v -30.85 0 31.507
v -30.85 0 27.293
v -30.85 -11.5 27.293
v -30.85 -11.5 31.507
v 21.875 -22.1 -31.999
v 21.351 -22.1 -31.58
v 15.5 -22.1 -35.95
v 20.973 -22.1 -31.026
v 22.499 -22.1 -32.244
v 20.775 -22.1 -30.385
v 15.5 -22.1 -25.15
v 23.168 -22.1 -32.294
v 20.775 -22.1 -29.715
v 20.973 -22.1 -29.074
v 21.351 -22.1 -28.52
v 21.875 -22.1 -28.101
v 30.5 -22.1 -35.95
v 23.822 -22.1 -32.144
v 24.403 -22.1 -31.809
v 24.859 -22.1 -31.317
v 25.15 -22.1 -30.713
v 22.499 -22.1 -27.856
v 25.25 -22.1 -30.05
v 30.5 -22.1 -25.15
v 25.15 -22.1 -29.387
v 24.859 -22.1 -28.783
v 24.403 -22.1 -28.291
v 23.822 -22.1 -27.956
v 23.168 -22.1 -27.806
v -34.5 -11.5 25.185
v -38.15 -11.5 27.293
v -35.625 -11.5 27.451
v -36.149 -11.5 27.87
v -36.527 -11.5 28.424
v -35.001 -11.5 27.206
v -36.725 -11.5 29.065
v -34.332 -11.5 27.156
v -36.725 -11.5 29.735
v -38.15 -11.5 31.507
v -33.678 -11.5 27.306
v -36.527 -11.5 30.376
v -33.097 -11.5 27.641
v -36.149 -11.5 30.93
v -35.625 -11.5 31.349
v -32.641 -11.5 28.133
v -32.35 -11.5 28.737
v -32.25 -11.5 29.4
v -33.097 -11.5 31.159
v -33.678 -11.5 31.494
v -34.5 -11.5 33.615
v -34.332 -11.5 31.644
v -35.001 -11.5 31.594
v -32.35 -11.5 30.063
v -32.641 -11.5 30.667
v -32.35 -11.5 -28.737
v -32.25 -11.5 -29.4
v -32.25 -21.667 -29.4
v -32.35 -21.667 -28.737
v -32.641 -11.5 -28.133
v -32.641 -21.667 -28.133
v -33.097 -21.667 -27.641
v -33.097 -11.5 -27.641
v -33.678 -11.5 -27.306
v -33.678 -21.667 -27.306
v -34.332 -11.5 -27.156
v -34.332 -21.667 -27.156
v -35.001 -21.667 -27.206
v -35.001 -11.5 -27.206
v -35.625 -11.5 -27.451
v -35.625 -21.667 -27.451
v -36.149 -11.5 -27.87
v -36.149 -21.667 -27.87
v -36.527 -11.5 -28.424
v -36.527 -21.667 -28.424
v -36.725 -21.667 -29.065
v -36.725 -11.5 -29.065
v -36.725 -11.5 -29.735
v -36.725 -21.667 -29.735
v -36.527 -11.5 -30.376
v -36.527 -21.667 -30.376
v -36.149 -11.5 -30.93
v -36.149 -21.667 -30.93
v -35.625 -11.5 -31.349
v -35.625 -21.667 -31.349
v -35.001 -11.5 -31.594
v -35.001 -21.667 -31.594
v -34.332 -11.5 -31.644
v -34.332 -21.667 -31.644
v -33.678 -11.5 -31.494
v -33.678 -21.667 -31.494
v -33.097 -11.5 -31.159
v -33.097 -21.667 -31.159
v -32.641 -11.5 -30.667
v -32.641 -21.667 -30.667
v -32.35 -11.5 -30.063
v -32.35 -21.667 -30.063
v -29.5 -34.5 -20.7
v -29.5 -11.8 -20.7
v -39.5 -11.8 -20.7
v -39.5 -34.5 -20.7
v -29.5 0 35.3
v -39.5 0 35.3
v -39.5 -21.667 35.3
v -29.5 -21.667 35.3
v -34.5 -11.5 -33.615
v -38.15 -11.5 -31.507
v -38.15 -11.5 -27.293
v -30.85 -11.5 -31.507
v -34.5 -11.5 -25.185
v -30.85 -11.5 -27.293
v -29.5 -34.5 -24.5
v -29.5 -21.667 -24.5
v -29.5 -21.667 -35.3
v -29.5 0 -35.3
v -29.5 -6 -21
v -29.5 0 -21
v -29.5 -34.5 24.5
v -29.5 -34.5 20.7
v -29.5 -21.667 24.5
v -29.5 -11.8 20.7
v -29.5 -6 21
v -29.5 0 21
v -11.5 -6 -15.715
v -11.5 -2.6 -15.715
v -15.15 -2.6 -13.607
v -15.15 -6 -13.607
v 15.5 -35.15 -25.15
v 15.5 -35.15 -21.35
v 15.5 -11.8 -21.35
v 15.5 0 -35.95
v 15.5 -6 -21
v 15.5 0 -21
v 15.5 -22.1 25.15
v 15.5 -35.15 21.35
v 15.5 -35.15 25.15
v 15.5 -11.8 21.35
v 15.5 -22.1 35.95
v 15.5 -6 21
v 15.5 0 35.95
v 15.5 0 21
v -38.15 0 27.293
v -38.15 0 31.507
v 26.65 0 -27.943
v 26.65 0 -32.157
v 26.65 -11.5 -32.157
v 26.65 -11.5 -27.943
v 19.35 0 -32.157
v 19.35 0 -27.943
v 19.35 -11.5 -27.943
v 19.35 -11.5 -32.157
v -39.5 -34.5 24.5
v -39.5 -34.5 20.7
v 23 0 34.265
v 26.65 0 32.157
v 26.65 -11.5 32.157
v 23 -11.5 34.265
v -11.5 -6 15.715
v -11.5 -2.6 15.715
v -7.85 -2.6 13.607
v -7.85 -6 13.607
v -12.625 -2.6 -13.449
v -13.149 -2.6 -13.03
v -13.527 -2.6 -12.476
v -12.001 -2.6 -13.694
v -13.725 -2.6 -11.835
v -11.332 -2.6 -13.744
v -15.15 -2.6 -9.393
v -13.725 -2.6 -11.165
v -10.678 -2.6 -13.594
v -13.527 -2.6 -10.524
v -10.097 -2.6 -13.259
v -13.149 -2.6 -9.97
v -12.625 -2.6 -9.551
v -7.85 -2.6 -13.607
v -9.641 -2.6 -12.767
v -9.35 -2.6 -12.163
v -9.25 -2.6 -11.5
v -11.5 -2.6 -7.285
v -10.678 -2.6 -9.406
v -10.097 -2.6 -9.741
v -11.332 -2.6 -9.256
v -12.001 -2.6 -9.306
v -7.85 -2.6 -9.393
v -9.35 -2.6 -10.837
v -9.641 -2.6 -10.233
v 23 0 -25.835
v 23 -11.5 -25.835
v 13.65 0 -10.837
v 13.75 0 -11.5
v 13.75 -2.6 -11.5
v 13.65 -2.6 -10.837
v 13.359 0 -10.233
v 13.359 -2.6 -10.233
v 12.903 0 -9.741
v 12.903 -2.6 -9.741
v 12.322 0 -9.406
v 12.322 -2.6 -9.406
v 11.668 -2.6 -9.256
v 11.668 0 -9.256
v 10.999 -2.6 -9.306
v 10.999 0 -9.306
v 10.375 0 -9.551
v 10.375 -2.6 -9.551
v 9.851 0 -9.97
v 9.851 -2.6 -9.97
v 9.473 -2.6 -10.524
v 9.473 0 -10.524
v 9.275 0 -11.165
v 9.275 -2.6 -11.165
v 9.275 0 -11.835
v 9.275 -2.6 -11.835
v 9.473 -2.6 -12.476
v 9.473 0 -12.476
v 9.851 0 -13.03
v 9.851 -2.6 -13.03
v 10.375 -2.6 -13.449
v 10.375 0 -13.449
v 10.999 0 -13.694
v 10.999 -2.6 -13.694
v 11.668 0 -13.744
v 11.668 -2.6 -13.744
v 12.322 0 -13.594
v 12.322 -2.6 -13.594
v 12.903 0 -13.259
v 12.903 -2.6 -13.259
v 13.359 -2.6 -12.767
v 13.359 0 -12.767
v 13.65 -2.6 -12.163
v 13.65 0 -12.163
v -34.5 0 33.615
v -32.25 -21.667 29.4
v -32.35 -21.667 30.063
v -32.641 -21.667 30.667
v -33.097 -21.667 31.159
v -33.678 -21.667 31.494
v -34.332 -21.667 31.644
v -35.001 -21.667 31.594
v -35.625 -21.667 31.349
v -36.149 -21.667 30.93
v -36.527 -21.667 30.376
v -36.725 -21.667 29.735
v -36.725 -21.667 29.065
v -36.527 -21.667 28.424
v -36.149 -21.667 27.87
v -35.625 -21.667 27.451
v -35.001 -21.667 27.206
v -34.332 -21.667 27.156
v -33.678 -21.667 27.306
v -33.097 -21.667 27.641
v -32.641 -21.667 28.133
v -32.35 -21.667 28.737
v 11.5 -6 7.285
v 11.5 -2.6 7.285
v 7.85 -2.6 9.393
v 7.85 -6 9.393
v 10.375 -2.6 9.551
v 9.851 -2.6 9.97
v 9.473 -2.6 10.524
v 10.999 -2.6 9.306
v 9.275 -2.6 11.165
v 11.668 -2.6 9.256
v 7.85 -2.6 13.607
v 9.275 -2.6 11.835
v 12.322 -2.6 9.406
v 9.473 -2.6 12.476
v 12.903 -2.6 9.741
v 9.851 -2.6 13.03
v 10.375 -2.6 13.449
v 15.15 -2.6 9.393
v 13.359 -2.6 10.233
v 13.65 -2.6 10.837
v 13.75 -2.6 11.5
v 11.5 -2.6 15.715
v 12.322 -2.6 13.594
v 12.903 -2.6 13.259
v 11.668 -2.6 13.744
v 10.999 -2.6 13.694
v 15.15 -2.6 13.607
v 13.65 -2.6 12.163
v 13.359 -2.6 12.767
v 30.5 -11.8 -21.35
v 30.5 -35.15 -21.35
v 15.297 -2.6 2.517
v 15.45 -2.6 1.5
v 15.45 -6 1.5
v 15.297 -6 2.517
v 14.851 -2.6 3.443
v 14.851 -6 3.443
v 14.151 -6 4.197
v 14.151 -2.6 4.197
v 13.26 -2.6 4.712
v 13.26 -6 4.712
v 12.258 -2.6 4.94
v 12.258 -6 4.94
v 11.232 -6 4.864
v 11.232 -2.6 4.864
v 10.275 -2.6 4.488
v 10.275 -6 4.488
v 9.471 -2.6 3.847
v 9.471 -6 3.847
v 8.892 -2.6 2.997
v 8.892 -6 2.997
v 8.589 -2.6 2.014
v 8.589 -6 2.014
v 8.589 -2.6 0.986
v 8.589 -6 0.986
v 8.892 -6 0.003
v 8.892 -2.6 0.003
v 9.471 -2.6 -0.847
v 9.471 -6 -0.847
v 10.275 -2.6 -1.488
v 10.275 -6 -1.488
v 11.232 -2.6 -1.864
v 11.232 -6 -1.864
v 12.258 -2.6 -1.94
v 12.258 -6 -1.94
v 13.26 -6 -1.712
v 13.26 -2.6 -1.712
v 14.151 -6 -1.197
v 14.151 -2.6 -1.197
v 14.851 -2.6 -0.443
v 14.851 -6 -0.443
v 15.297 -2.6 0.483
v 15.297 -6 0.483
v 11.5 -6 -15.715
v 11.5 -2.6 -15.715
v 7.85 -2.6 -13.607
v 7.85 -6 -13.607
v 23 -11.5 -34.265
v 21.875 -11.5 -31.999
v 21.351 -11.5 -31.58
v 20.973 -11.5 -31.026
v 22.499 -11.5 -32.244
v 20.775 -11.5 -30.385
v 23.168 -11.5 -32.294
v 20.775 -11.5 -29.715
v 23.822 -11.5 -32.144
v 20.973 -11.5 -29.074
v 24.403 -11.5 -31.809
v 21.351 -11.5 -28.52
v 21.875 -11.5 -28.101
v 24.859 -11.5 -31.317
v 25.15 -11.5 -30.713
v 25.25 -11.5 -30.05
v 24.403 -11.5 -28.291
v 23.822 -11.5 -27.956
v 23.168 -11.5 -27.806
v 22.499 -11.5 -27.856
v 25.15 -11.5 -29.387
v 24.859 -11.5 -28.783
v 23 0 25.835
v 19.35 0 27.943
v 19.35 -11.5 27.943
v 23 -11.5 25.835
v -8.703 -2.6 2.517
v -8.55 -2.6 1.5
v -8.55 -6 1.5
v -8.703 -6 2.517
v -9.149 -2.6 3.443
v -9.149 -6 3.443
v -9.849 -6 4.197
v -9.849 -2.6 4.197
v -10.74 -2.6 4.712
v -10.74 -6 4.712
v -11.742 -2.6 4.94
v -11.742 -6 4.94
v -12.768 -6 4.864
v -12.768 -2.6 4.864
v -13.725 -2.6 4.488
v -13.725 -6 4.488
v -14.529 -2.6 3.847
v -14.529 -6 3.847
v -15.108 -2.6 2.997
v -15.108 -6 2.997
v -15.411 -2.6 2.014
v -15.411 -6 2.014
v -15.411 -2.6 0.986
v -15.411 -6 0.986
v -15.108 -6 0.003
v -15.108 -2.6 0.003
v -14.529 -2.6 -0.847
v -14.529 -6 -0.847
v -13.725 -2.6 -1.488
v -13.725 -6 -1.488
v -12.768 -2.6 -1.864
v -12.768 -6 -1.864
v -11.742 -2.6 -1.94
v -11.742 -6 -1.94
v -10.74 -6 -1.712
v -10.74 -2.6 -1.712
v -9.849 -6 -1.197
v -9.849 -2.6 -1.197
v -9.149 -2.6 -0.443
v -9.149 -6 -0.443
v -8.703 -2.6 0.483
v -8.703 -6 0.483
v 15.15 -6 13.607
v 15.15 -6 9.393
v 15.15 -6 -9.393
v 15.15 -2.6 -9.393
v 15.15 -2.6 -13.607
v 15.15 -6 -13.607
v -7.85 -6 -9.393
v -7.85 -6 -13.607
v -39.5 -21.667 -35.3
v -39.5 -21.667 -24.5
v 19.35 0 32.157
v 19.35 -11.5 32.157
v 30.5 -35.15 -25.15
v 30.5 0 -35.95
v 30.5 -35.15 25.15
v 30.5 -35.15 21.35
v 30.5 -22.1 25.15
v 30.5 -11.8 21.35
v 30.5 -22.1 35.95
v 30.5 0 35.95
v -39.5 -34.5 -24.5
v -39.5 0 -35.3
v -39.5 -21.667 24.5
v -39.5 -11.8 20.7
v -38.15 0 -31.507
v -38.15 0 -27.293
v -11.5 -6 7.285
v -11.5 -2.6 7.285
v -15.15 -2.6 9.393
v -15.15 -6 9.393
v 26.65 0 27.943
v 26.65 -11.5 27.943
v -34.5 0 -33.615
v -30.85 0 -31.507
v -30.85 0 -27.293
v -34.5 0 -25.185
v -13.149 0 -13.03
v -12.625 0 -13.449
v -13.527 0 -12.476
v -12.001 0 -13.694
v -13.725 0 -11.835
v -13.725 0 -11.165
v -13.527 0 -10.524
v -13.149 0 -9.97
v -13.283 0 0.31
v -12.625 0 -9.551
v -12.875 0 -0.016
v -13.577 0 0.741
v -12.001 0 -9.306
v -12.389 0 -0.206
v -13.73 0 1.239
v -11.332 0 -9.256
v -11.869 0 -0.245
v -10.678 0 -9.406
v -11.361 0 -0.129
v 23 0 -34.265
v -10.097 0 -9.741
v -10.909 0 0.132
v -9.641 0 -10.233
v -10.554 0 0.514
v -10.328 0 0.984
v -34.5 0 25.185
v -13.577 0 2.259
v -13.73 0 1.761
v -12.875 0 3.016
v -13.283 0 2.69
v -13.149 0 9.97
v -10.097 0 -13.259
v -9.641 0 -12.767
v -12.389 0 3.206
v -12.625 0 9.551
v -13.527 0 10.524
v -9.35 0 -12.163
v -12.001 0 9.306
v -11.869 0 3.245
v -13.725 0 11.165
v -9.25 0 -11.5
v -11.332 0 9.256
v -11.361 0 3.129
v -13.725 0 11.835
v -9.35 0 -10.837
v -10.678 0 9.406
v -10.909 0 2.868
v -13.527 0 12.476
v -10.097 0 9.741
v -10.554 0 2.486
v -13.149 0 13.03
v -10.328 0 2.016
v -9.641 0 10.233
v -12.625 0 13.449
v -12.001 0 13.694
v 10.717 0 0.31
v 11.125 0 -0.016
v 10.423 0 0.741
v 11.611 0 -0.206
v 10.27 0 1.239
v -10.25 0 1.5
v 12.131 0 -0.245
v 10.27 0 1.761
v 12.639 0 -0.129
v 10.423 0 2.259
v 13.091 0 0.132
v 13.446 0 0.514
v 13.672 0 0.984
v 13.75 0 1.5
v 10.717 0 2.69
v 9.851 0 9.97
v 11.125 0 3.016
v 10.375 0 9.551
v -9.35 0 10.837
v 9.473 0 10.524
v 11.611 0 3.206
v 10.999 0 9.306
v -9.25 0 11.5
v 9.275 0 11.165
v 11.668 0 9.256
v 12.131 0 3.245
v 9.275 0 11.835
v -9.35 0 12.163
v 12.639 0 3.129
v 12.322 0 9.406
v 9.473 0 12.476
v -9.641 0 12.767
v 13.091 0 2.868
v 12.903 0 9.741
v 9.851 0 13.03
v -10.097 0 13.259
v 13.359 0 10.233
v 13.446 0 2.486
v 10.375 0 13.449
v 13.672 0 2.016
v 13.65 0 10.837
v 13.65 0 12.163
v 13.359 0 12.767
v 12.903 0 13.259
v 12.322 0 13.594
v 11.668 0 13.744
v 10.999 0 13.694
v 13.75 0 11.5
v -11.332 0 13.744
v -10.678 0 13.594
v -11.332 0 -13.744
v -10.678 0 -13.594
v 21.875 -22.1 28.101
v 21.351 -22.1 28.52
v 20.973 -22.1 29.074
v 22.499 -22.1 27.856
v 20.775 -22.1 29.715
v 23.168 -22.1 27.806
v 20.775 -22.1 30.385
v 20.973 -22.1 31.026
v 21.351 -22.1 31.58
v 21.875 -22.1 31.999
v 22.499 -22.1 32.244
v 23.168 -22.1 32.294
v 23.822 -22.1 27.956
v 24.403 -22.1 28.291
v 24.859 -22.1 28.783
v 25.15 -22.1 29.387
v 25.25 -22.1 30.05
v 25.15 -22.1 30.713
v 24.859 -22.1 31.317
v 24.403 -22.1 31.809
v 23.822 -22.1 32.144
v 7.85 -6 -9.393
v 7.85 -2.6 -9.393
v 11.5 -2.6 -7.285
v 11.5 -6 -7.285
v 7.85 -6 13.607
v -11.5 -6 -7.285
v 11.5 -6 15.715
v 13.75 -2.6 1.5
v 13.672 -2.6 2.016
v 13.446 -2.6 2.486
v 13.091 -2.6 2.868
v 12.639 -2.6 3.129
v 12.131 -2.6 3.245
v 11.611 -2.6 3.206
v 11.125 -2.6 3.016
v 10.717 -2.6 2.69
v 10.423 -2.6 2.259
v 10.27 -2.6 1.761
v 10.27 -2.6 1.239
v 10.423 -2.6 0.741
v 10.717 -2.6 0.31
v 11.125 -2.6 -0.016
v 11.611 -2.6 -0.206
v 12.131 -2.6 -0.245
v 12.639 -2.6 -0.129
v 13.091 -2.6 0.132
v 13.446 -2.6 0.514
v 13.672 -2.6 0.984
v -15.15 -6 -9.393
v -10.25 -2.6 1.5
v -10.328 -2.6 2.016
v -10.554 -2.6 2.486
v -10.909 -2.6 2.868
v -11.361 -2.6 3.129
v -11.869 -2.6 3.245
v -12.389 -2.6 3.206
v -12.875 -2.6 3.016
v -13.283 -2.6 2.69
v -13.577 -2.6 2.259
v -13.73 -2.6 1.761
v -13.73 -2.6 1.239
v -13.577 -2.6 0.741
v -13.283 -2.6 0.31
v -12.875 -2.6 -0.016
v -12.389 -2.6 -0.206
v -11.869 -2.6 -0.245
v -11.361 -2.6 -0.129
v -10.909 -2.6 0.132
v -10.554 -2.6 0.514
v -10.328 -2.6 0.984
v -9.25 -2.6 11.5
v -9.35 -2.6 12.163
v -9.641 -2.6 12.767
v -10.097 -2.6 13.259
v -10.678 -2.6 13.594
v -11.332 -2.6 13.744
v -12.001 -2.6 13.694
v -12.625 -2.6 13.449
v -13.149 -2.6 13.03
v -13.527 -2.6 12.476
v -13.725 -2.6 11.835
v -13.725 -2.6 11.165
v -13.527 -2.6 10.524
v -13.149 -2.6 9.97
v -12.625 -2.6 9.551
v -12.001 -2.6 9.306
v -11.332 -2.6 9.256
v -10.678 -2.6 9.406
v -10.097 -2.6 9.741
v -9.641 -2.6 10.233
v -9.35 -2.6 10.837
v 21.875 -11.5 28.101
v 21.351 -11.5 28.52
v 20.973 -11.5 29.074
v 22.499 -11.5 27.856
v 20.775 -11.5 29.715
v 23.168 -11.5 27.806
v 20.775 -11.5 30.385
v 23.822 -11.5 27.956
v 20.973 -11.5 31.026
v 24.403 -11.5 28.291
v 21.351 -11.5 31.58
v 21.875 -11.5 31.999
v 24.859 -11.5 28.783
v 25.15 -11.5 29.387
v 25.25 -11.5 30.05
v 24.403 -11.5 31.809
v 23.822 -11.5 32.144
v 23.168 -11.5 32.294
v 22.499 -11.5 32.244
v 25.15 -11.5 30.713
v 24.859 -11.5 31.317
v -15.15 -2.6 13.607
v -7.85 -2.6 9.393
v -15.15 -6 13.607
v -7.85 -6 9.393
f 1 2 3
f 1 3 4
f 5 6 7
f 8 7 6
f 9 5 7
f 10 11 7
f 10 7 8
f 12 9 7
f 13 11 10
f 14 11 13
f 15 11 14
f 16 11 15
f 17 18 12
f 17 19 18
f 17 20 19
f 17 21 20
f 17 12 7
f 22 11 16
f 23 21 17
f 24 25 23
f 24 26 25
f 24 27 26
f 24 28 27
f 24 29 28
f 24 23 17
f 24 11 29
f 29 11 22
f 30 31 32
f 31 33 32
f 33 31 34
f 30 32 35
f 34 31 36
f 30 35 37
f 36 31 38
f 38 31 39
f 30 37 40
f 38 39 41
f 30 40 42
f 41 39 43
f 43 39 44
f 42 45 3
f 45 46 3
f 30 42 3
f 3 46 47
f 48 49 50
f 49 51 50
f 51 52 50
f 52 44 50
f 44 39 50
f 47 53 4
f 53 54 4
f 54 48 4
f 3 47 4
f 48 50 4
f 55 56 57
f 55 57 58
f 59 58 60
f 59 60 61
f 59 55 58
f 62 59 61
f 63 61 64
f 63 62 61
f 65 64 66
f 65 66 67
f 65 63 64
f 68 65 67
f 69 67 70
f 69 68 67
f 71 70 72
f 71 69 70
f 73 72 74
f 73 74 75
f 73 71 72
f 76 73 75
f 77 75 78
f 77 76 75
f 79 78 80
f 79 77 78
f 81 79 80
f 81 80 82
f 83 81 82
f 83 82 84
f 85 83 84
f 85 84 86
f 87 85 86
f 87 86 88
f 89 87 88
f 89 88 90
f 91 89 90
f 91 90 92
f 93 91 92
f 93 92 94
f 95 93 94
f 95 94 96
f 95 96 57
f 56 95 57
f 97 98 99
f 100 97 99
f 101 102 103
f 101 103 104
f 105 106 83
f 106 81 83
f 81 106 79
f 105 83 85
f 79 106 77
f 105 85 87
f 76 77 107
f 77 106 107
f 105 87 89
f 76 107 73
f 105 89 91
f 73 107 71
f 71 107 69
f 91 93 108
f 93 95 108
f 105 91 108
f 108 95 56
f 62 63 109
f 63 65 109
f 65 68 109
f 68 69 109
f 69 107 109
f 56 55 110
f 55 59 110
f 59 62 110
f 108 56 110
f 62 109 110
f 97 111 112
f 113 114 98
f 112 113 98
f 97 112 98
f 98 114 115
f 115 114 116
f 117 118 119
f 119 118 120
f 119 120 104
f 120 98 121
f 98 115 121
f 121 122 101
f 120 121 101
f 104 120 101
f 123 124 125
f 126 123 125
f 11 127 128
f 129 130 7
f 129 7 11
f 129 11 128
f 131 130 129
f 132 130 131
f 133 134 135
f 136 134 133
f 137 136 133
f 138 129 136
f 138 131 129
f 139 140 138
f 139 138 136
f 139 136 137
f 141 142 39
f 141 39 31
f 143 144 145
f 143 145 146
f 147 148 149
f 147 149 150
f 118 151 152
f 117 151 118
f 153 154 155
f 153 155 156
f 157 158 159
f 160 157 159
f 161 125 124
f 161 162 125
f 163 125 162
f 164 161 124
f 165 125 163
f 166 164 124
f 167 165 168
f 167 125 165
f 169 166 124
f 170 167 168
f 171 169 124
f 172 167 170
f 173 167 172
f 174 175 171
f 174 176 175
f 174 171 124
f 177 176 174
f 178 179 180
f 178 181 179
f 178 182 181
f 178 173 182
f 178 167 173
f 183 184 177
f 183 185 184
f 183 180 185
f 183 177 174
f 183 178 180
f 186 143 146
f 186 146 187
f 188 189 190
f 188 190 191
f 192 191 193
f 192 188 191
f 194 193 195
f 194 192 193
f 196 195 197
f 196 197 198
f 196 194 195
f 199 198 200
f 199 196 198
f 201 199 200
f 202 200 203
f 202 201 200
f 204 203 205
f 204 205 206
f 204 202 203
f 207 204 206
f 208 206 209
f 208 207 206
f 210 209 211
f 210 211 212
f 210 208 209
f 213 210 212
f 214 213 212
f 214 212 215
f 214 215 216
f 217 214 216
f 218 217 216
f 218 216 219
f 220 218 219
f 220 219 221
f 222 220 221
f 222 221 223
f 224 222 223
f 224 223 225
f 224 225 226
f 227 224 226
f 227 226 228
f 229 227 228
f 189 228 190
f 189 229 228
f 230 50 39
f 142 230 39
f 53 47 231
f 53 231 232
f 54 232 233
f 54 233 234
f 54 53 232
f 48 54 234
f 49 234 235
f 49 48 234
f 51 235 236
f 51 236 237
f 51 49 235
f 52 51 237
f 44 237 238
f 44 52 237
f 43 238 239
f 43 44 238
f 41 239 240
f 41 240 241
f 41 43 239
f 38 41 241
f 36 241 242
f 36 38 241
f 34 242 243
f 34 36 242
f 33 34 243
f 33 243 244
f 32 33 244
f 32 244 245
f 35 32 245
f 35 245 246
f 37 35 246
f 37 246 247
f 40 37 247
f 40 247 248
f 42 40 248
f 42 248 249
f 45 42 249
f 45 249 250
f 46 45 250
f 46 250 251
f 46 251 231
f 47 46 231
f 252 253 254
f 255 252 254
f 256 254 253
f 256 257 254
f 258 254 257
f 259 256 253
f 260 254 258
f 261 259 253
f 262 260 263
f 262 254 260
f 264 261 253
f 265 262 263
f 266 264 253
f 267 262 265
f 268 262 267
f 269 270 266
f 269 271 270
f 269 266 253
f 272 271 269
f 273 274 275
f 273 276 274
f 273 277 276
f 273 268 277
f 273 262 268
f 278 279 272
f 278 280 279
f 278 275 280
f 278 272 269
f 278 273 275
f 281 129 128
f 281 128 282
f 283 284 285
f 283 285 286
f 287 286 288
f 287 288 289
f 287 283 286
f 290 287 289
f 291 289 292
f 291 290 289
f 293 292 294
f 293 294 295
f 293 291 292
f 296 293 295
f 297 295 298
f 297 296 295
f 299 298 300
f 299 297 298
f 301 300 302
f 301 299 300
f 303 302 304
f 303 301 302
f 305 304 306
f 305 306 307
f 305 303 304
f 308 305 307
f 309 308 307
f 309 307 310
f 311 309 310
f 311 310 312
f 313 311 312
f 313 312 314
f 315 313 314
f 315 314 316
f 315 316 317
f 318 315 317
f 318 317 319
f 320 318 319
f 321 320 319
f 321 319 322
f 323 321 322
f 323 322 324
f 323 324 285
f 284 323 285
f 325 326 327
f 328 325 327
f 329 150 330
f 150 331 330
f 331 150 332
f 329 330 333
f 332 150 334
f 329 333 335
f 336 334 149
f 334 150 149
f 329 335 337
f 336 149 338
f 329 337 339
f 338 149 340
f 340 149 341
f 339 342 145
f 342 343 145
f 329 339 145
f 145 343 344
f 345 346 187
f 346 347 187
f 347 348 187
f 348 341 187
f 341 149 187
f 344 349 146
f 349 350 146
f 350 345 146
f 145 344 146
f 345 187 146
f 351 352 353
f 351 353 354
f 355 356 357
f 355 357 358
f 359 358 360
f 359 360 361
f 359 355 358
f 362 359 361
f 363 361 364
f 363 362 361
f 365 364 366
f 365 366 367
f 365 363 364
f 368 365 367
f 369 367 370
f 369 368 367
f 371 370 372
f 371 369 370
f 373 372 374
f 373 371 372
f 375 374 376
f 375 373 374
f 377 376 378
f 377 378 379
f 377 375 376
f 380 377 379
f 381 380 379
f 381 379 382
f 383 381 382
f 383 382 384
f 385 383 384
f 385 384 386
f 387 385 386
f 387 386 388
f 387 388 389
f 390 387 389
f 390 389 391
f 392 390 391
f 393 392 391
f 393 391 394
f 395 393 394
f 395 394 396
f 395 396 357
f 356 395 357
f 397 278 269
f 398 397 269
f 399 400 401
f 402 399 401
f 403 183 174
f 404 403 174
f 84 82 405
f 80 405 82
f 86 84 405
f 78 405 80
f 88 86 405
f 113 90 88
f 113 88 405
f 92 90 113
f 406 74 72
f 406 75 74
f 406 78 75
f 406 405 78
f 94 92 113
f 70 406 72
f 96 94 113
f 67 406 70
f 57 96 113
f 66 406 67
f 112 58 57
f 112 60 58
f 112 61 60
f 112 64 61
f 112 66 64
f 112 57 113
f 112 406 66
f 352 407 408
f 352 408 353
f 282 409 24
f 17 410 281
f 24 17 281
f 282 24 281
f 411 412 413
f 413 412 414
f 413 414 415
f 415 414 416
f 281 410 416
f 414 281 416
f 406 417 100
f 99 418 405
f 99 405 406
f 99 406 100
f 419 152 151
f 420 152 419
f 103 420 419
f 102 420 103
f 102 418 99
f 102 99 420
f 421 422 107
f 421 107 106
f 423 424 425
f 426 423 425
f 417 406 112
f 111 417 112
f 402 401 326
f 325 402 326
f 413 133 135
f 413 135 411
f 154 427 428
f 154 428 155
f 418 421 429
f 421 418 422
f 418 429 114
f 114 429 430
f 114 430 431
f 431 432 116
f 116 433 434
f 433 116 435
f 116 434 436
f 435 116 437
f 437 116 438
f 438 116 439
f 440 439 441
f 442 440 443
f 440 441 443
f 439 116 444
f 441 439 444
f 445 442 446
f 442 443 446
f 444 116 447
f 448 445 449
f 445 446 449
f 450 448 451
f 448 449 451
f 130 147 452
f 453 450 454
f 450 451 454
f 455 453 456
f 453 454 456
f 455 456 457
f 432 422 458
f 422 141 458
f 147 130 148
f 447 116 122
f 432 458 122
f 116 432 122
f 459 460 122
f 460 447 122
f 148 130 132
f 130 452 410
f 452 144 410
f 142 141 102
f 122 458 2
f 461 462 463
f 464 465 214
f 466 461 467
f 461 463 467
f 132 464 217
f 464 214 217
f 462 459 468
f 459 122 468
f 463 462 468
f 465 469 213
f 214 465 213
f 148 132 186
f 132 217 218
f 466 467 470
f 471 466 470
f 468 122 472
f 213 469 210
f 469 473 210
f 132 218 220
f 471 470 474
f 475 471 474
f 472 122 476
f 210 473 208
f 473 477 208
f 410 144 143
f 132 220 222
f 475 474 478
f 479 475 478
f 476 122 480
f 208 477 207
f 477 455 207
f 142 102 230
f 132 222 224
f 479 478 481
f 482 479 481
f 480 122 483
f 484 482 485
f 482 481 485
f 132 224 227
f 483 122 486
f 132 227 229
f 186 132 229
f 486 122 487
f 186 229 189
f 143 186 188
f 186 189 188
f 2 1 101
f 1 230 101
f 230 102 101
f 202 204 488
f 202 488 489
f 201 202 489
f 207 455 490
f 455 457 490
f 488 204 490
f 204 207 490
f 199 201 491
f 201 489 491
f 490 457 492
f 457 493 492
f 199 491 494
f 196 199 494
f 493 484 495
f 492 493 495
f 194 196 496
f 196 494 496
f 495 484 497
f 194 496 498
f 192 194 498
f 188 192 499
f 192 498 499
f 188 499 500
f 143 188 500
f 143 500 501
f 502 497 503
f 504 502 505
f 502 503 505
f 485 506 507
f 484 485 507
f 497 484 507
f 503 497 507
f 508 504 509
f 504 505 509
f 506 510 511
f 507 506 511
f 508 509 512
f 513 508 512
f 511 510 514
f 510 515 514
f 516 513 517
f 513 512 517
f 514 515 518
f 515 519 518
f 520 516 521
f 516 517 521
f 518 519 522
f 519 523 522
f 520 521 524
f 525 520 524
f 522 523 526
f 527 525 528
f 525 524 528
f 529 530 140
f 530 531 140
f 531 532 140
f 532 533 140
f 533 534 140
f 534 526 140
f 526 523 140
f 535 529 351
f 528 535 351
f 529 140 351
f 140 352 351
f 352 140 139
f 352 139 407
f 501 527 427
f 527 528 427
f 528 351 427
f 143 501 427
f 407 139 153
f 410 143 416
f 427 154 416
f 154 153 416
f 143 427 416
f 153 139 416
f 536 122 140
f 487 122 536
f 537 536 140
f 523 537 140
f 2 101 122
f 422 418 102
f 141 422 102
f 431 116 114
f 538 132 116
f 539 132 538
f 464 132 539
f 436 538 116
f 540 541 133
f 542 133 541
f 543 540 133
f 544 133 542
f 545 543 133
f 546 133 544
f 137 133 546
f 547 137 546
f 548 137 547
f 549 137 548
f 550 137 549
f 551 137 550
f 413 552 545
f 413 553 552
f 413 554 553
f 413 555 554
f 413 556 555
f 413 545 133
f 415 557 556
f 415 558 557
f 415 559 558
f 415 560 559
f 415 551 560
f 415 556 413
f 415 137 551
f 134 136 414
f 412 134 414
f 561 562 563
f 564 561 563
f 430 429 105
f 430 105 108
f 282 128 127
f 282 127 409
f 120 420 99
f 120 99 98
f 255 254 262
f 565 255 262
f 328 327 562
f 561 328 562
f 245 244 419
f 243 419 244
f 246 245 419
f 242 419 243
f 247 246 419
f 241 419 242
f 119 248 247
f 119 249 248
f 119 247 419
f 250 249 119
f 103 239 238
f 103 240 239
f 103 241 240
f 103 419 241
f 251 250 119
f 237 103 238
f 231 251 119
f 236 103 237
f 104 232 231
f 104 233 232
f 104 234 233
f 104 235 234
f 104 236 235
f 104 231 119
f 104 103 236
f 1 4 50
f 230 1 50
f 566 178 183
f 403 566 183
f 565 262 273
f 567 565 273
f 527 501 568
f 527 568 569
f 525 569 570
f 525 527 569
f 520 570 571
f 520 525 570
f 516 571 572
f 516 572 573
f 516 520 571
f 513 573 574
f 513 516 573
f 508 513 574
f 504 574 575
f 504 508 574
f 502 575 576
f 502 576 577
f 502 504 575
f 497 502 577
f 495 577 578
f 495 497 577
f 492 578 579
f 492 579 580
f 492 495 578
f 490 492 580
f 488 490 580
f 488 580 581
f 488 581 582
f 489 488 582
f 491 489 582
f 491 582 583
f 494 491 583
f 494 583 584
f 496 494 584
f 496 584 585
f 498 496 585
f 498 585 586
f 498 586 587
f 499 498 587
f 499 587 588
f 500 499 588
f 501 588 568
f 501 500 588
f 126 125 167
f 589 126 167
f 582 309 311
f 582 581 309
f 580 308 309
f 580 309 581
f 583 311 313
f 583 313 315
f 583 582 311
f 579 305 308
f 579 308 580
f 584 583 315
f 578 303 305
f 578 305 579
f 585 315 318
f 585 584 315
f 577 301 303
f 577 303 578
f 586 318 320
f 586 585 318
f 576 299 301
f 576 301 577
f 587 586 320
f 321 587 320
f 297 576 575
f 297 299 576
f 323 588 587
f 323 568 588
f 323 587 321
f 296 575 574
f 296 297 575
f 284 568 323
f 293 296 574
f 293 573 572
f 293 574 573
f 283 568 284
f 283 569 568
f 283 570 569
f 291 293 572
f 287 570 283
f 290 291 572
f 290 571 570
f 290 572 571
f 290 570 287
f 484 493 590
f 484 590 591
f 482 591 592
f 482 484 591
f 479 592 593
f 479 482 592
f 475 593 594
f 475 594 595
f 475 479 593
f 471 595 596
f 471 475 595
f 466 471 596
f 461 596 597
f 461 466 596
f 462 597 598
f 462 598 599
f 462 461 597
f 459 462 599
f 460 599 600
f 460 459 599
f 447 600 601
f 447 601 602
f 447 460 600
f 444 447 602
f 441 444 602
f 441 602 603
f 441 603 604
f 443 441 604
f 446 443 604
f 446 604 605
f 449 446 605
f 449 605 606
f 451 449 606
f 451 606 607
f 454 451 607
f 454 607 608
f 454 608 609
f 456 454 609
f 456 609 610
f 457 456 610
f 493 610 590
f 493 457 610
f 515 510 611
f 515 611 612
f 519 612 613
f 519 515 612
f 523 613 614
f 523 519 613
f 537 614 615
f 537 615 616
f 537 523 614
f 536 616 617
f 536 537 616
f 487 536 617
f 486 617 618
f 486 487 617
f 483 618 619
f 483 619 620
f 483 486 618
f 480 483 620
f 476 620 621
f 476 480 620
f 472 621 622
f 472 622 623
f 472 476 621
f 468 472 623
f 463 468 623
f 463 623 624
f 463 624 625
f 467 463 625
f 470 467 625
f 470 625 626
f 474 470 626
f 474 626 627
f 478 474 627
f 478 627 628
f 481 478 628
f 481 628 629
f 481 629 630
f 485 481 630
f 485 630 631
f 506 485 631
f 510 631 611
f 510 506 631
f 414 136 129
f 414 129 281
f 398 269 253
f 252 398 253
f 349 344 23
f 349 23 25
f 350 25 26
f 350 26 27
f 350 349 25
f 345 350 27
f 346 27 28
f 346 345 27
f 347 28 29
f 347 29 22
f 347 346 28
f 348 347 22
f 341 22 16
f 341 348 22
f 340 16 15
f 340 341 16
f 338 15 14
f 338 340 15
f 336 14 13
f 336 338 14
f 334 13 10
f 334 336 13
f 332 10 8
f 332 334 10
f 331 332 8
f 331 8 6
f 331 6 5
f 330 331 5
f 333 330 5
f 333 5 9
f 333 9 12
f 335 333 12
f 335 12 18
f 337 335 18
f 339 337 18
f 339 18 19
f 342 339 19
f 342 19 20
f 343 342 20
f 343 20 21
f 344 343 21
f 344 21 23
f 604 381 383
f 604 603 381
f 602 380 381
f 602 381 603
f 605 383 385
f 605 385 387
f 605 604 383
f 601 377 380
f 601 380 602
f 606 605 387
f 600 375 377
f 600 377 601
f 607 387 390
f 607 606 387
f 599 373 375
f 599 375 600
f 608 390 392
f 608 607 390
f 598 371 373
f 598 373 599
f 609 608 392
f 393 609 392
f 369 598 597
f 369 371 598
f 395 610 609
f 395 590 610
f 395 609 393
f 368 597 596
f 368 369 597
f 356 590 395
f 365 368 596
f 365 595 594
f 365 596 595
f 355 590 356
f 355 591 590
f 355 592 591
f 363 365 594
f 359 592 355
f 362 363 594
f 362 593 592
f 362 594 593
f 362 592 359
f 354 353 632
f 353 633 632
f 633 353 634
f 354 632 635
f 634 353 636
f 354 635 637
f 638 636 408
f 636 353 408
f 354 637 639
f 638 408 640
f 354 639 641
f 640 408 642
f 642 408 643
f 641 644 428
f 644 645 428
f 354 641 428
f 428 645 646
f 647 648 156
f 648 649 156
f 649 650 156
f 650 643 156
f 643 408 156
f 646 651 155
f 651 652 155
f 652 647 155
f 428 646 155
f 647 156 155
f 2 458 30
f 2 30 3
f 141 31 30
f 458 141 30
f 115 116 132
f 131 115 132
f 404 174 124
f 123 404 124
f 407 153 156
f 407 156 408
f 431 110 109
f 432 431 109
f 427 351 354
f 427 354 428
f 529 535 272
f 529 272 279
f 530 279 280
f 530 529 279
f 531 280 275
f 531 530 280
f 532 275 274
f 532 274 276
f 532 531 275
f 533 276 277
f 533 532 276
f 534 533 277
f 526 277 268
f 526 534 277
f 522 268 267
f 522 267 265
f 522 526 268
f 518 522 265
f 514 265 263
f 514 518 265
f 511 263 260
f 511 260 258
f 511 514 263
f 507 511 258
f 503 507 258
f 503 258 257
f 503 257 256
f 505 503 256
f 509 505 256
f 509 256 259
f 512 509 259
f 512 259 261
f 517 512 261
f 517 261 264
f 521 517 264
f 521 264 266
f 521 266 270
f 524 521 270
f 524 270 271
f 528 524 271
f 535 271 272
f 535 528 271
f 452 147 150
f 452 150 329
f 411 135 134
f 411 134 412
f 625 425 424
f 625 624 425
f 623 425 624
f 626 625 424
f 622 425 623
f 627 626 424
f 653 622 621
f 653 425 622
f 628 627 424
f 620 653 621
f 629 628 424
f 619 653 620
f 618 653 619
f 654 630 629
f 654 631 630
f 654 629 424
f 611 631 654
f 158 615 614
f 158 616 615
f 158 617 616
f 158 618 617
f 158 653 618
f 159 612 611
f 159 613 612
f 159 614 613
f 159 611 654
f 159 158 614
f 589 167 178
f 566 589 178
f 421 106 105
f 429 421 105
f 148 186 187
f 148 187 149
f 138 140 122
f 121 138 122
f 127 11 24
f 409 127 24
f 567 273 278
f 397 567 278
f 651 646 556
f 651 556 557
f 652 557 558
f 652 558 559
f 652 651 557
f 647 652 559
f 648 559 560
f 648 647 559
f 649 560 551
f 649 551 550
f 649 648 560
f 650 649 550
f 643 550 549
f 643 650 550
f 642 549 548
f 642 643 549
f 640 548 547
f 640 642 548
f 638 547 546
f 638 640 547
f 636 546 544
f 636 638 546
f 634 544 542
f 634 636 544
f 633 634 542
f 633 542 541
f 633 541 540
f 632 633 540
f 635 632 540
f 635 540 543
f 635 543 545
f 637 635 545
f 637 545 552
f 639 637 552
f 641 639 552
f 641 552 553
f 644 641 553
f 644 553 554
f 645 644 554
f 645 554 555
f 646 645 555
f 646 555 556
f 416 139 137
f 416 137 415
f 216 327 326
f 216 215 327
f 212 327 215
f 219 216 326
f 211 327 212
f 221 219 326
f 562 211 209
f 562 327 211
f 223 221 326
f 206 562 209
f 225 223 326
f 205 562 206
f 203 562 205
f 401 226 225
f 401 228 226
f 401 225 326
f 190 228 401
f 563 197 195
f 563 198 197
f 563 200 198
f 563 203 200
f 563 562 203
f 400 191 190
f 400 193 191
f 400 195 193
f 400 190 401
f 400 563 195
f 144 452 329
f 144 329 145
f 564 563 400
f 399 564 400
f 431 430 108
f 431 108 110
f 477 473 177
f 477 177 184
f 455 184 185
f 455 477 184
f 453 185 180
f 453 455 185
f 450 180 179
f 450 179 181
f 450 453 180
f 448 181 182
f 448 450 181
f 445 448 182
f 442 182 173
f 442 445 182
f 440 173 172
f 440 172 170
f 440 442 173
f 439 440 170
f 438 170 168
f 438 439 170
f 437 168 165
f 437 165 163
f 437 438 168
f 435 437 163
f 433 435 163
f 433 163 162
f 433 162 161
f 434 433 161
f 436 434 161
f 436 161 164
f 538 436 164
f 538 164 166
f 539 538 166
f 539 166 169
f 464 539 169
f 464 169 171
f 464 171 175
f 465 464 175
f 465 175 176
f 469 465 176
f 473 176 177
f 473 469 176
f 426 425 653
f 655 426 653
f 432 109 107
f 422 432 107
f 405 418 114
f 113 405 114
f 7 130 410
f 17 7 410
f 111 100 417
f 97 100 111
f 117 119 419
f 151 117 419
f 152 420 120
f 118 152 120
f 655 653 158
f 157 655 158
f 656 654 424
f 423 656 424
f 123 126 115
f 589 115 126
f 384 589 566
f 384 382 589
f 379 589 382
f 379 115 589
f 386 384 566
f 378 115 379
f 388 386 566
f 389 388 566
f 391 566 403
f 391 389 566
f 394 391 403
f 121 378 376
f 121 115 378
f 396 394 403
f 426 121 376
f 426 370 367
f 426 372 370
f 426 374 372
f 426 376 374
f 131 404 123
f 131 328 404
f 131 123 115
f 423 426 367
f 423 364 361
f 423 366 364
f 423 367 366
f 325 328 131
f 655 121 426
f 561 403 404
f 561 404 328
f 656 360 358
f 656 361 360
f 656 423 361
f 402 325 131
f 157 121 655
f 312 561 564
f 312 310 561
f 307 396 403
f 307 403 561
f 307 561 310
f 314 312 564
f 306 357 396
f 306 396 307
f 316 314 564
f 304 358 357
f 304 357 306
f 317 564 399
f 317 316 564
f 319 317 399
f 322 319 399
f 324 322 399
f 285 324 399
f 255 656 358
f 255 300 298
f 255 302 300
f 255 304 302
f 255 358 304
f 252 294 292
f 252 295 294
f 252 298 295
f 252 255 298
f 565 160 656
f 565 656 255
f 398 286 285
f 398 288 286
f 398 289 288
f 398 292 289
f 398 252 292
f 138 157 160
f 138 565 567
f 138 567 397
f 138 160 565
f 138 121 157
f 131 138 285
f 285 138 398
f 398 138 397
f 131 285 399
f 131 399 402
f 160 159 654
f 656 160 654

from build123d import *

# Parameters (mm, degrees)
F0_R     = 3.45
F1_DEPTH = 6
F0_W     = 10
F0_H     = 41.4
F2_DEPTH = 11.8
F3_DEPTH = 34.5
F0_W_2   = 15
F0_H_2   = 3.8
F4_DEPTH = 35.15
F0_H_3   = 10.8
F0_R_2   = 2.25
F5_DEPTH = 21.667
F6_DEPTH = 22.1
F0_R_3   = 1.75
F7_DEPTH = 2.6
F8_DEPTH = 11.5


with BuildPart() as f1:
    # F0 (on Front) → F1 (new body)
    with BuildSketch(Plane.XZ):
        Polygon((15.5, 21), (-29.5, 21), (-29.5, 20.7), (-29.5, -20.7), (-29.5, -21), (15.5, -21), align=None)
        Polygon((-15.15, -13.607328), (-15.15, -9.392672), (-11.5, -7.285343), (-7.85, -9.392672), (-7.85, -13.607328), (-11.5, -15.714657), align=None, mode=Mode.SUBTRACT)
        Polygon((11.5, -15.714657), (7.85, -13.607328), (7.85, -9.392672), (11.5, -7.285343), (15.15, -9.392672), (15.15, -13.607328), align=None, mode=Mode.SUBTRACT)
        with Locations((-12, 1.5)):
            Circle(F0_R, mode=Mode.SUBTRACT)
        Polygon((-11.5, 15.714657), (-7.85, 13.607328), (-7.85, 9.392672), (-11.5, 7.285343), (-15.15, 9.392672), (-15.15, 13.607328), align=None, mode=Mode.SUBTRACT)
        with Locations((12, 1.5)):
            Circle(F0_R, mode=Mode.SUBTRACT)
        Polygon((7.85, 9.392672), (7.85, 13.607328), (11.5, 15.714657), (15.15, 13.607328), (15.15, 9.392672), (11.5, 7.285343), align=None, mode=Mode.SUBTRACT)
    extrude(amount=F1_DEPTH)

    # F0 (on Front) → F2 (join)
    with BuildSketch(Plane.XZ):
        with Locations((-34.5, 0)):
            Rectangle(F0_W, F0_H)
        Polygon((15.5, 21.35), (15.5, 21), (15.5, -21), (15.5, -21.35), (30.5, -21.35), (30.5, 21.35), align=None)
    extrude(amount=F2_DEPTH)

    # F0 (on Front) → F3 (join)
    with BuildSketch(Plane.XZ):
        Polygon((-29.5, 24.5), (-39.5, 24.5), (-39.5, 20.7), (-29.5, 20.7), (-29.5, 21), align=None)
        Polygon((-29.5, -20.7), (-39.5, -20.7), (-39.5, -24.5), (-29.5, -24.5), (-29.5, -21), align=None)
    extrude(amount=F3_DEPTH)

    # F0 (on Front) → F4 (join)
    with BuildSketch(Plane.XZ):
        with Locations((23, -23.25)):
            Rectangle(F0_W_2, F0_H_2)
        with Locations((23, 23.25)):
            Rectangle(F0_W_2, F0_H_2)
    extrude(amount=F4_DEPTH)

    # F0 (on Front) → F5 (join)
    with BuildSketch(Plane.XZ):
        with Locations((-34.5, -29.9)):
            Rectangle(F0_W, F0_H_3)
        Polygon((-34.5, -25.185343), (-30.85, -27.292672), (-30.85, -31.507328), (-34.5, -33.614657), (-38.15, -31.507328), (-38.15, -27.292672), align=None, mode=Mode.SUBTRACT)
        Polygon((-30.85, -31.507328), (-30.85, -27.292672), (-34.5, -25.185343), (-38.15, -27.292672), (-38.15, -31.507328), (-34.5, -33.614657), align=None)
        with Locations((-34.5, -29.4)):
            Circle(F0_R_2, mode=Mode.SUBTRACT)
        with Locations((-34.5, 29.9)):
            Rectangle(F0_W, F0_H_3)
        Polygon((-34.5, 33.614657), (-30.85, 31.507328), (-30.85, 27.292672), (-34.5, 25.185343), (-38.15, 27.292672), (-38.15, 31.507328), align=None, mode=Mode.SUBTRACT)
        Polygon((-30.85, 27.292672), (-30.85, 31.507328), (-34.5, 33.614657), (-38.15, 31.507328), (-38.15, 27.292672), (-34.5, 25.185343), align=None)
        with Locations((-34.5, 29.4)):
            Circle(F0_R_2, mode=Mode.SUBTRACT)
    extrude(amount=F5_DEPTH)

    # F0 (on Front) → F6 (join)
    with BuildSketch(Plane.XZ):
        with Locations((23, -30.55)):
            Rectangle(F0_W_2, F0_H_3)
        Polygon((26.65, -27.942672), (26.65, -32.157328), (23, -34.264657), (19.35, -32.157328), (19.35, -27.942672), (23, -25.835343), align=None, mode=Mode.SUBTRACT)
        Polygon((23, -34.264657), (26.65, -32.157328), (26.65, -27.942672), (23, -25.835343), (19.35, -27.942672), (19.35, -32.157328), align=None)
        with Locations((23, -30.05)):
            Circle(F0_R_2, mode=Mode.SUBTRACT)
        with Locations((23, 30.55)):
            Rectangle(F0_W_2, F0_H_3)
        Polygon((23, 34.264657), (26.65, 32.157328), (26.65, 27.942672), (23, 25.835343), (19.35, 27.942672), (19.35, 32.157328), align=None, mode=Mode.SUBTRACT)
        Polygon((26.65, 27.942672), (26.65, 32.157328), (23, 34.264657), (19.35, 32.157328), (19.35, 27.942672), (23, 25.835343), align=None)
        with Locations((23, 30.05)):
            Circle(F0_R_2, mode=Mode.SUBTRACT)
    extrude(amount=F6_DEPTH)

    # F0 (on Front) → F7 (join)
    with BuildSketch(Plane.XZ):
        Polygon((-7.85, 9.392672), (-7.85, 13.607328), (-11.5, 15.714657), (-15.15, 13.607328), (-15.15, 9.392672), (-11.5, 7.285343), align=None)
        with Locations((-11.5, 11.5)):
            Circle(F0_R_2, mode=Mode.SUBTRACT)
        Polygon((11.5, 15.714657), (7.85, 13.607328), (7.85, 9.392672), (11.5, 7.285343), (15.15, 9.392672), (15.15, 13.607328), align=None)
        with Locations((11.5, 11.5)):
            Circle(F0_R_2, mode=Mode.SUBTRACT)
        Polygon((7.85, -9.392672), (7.85, -13.607328), (11.5, -15.714657), (15.15, -13.607328), (15.15, -9.392672), (11.5, -7.285343), align=None)
        with Locations((11.5, -11.5)):
            Circle(F0_R_2, mode=Mode.SUBTRACT)
        Polygon((-11.5, -7.285343), (-15.15, -9.392672), (-15.15, -13.607328), (-11.5, -15.714657), (-7.85, -13.607328), (-7.85, -9.392672), align=None)
        with Locations((-11.5, -11.5)):
            Circle(F0_R_2, mode=Mode.SUBTRACT)
        with Locations((-12, 1.5)):
            Circle(F0_R)
        with Locations((-12, 1.5)):
            Circle(F0_R_3, mode=Mode.SUBTRACT)
        with Locations((12, 1.5)):
            Circle(F0_R)
        with Locations((12, 1.5)):
            Circle(F0_R_3, mode=Mode.SUBTRACT)
    extrude(amount=F7_DEPTH)

    # F0 (on Front) → F8 (cut)
    with BuildSketch(Plane.XZ):
        Polygon((23, -34.264657), (26.65, -32.157328), (26.65, -27.942672), (23, -25.835343), (19.35, -27.942672), (19.35, -32.157328), align=None)
        with Locations((23, -30.05)):
            Circle(F0_R_2, mode=Mode.SUBTRACT)
        Polygon((26.65, 27.942672), (26.65, 32.157328), (23, 34.264657), (19.35, 32.157328), (19.35, 27.942672), (23, 25.835343), align=None)
        with Locations((23, 30.05)):
            Circle(F0_R_2, mode=Mode.SUBTRACT)
        Polygon((-30.85, 27.292672), (-30.85, 31.507328), (-34.5, 33.614657), (-38.15, 31.507328), (-38.15, 27.292672), (-34.5, 25.185343), align=None)
        with Locations((-34.5, 29.4)):
            Circle(F0_R_2, mode=Mode.SUBTRACT)
        Polygon((-30.85, -31.507328), (-30.85, -27.292672), (-34.5, -25.185343), (-38.15, -27.292672), (-38.15, -31.507328), (-34.5, -33.614657), align=None)
        with Locations((-34.5, -29.4)):
            Circle(F0_R_2, mode=Mode.SUBTRACT)
    extrude(amount=F8_DEPTH, mode=Mode.SUBTRACT)


solid = f1.part
